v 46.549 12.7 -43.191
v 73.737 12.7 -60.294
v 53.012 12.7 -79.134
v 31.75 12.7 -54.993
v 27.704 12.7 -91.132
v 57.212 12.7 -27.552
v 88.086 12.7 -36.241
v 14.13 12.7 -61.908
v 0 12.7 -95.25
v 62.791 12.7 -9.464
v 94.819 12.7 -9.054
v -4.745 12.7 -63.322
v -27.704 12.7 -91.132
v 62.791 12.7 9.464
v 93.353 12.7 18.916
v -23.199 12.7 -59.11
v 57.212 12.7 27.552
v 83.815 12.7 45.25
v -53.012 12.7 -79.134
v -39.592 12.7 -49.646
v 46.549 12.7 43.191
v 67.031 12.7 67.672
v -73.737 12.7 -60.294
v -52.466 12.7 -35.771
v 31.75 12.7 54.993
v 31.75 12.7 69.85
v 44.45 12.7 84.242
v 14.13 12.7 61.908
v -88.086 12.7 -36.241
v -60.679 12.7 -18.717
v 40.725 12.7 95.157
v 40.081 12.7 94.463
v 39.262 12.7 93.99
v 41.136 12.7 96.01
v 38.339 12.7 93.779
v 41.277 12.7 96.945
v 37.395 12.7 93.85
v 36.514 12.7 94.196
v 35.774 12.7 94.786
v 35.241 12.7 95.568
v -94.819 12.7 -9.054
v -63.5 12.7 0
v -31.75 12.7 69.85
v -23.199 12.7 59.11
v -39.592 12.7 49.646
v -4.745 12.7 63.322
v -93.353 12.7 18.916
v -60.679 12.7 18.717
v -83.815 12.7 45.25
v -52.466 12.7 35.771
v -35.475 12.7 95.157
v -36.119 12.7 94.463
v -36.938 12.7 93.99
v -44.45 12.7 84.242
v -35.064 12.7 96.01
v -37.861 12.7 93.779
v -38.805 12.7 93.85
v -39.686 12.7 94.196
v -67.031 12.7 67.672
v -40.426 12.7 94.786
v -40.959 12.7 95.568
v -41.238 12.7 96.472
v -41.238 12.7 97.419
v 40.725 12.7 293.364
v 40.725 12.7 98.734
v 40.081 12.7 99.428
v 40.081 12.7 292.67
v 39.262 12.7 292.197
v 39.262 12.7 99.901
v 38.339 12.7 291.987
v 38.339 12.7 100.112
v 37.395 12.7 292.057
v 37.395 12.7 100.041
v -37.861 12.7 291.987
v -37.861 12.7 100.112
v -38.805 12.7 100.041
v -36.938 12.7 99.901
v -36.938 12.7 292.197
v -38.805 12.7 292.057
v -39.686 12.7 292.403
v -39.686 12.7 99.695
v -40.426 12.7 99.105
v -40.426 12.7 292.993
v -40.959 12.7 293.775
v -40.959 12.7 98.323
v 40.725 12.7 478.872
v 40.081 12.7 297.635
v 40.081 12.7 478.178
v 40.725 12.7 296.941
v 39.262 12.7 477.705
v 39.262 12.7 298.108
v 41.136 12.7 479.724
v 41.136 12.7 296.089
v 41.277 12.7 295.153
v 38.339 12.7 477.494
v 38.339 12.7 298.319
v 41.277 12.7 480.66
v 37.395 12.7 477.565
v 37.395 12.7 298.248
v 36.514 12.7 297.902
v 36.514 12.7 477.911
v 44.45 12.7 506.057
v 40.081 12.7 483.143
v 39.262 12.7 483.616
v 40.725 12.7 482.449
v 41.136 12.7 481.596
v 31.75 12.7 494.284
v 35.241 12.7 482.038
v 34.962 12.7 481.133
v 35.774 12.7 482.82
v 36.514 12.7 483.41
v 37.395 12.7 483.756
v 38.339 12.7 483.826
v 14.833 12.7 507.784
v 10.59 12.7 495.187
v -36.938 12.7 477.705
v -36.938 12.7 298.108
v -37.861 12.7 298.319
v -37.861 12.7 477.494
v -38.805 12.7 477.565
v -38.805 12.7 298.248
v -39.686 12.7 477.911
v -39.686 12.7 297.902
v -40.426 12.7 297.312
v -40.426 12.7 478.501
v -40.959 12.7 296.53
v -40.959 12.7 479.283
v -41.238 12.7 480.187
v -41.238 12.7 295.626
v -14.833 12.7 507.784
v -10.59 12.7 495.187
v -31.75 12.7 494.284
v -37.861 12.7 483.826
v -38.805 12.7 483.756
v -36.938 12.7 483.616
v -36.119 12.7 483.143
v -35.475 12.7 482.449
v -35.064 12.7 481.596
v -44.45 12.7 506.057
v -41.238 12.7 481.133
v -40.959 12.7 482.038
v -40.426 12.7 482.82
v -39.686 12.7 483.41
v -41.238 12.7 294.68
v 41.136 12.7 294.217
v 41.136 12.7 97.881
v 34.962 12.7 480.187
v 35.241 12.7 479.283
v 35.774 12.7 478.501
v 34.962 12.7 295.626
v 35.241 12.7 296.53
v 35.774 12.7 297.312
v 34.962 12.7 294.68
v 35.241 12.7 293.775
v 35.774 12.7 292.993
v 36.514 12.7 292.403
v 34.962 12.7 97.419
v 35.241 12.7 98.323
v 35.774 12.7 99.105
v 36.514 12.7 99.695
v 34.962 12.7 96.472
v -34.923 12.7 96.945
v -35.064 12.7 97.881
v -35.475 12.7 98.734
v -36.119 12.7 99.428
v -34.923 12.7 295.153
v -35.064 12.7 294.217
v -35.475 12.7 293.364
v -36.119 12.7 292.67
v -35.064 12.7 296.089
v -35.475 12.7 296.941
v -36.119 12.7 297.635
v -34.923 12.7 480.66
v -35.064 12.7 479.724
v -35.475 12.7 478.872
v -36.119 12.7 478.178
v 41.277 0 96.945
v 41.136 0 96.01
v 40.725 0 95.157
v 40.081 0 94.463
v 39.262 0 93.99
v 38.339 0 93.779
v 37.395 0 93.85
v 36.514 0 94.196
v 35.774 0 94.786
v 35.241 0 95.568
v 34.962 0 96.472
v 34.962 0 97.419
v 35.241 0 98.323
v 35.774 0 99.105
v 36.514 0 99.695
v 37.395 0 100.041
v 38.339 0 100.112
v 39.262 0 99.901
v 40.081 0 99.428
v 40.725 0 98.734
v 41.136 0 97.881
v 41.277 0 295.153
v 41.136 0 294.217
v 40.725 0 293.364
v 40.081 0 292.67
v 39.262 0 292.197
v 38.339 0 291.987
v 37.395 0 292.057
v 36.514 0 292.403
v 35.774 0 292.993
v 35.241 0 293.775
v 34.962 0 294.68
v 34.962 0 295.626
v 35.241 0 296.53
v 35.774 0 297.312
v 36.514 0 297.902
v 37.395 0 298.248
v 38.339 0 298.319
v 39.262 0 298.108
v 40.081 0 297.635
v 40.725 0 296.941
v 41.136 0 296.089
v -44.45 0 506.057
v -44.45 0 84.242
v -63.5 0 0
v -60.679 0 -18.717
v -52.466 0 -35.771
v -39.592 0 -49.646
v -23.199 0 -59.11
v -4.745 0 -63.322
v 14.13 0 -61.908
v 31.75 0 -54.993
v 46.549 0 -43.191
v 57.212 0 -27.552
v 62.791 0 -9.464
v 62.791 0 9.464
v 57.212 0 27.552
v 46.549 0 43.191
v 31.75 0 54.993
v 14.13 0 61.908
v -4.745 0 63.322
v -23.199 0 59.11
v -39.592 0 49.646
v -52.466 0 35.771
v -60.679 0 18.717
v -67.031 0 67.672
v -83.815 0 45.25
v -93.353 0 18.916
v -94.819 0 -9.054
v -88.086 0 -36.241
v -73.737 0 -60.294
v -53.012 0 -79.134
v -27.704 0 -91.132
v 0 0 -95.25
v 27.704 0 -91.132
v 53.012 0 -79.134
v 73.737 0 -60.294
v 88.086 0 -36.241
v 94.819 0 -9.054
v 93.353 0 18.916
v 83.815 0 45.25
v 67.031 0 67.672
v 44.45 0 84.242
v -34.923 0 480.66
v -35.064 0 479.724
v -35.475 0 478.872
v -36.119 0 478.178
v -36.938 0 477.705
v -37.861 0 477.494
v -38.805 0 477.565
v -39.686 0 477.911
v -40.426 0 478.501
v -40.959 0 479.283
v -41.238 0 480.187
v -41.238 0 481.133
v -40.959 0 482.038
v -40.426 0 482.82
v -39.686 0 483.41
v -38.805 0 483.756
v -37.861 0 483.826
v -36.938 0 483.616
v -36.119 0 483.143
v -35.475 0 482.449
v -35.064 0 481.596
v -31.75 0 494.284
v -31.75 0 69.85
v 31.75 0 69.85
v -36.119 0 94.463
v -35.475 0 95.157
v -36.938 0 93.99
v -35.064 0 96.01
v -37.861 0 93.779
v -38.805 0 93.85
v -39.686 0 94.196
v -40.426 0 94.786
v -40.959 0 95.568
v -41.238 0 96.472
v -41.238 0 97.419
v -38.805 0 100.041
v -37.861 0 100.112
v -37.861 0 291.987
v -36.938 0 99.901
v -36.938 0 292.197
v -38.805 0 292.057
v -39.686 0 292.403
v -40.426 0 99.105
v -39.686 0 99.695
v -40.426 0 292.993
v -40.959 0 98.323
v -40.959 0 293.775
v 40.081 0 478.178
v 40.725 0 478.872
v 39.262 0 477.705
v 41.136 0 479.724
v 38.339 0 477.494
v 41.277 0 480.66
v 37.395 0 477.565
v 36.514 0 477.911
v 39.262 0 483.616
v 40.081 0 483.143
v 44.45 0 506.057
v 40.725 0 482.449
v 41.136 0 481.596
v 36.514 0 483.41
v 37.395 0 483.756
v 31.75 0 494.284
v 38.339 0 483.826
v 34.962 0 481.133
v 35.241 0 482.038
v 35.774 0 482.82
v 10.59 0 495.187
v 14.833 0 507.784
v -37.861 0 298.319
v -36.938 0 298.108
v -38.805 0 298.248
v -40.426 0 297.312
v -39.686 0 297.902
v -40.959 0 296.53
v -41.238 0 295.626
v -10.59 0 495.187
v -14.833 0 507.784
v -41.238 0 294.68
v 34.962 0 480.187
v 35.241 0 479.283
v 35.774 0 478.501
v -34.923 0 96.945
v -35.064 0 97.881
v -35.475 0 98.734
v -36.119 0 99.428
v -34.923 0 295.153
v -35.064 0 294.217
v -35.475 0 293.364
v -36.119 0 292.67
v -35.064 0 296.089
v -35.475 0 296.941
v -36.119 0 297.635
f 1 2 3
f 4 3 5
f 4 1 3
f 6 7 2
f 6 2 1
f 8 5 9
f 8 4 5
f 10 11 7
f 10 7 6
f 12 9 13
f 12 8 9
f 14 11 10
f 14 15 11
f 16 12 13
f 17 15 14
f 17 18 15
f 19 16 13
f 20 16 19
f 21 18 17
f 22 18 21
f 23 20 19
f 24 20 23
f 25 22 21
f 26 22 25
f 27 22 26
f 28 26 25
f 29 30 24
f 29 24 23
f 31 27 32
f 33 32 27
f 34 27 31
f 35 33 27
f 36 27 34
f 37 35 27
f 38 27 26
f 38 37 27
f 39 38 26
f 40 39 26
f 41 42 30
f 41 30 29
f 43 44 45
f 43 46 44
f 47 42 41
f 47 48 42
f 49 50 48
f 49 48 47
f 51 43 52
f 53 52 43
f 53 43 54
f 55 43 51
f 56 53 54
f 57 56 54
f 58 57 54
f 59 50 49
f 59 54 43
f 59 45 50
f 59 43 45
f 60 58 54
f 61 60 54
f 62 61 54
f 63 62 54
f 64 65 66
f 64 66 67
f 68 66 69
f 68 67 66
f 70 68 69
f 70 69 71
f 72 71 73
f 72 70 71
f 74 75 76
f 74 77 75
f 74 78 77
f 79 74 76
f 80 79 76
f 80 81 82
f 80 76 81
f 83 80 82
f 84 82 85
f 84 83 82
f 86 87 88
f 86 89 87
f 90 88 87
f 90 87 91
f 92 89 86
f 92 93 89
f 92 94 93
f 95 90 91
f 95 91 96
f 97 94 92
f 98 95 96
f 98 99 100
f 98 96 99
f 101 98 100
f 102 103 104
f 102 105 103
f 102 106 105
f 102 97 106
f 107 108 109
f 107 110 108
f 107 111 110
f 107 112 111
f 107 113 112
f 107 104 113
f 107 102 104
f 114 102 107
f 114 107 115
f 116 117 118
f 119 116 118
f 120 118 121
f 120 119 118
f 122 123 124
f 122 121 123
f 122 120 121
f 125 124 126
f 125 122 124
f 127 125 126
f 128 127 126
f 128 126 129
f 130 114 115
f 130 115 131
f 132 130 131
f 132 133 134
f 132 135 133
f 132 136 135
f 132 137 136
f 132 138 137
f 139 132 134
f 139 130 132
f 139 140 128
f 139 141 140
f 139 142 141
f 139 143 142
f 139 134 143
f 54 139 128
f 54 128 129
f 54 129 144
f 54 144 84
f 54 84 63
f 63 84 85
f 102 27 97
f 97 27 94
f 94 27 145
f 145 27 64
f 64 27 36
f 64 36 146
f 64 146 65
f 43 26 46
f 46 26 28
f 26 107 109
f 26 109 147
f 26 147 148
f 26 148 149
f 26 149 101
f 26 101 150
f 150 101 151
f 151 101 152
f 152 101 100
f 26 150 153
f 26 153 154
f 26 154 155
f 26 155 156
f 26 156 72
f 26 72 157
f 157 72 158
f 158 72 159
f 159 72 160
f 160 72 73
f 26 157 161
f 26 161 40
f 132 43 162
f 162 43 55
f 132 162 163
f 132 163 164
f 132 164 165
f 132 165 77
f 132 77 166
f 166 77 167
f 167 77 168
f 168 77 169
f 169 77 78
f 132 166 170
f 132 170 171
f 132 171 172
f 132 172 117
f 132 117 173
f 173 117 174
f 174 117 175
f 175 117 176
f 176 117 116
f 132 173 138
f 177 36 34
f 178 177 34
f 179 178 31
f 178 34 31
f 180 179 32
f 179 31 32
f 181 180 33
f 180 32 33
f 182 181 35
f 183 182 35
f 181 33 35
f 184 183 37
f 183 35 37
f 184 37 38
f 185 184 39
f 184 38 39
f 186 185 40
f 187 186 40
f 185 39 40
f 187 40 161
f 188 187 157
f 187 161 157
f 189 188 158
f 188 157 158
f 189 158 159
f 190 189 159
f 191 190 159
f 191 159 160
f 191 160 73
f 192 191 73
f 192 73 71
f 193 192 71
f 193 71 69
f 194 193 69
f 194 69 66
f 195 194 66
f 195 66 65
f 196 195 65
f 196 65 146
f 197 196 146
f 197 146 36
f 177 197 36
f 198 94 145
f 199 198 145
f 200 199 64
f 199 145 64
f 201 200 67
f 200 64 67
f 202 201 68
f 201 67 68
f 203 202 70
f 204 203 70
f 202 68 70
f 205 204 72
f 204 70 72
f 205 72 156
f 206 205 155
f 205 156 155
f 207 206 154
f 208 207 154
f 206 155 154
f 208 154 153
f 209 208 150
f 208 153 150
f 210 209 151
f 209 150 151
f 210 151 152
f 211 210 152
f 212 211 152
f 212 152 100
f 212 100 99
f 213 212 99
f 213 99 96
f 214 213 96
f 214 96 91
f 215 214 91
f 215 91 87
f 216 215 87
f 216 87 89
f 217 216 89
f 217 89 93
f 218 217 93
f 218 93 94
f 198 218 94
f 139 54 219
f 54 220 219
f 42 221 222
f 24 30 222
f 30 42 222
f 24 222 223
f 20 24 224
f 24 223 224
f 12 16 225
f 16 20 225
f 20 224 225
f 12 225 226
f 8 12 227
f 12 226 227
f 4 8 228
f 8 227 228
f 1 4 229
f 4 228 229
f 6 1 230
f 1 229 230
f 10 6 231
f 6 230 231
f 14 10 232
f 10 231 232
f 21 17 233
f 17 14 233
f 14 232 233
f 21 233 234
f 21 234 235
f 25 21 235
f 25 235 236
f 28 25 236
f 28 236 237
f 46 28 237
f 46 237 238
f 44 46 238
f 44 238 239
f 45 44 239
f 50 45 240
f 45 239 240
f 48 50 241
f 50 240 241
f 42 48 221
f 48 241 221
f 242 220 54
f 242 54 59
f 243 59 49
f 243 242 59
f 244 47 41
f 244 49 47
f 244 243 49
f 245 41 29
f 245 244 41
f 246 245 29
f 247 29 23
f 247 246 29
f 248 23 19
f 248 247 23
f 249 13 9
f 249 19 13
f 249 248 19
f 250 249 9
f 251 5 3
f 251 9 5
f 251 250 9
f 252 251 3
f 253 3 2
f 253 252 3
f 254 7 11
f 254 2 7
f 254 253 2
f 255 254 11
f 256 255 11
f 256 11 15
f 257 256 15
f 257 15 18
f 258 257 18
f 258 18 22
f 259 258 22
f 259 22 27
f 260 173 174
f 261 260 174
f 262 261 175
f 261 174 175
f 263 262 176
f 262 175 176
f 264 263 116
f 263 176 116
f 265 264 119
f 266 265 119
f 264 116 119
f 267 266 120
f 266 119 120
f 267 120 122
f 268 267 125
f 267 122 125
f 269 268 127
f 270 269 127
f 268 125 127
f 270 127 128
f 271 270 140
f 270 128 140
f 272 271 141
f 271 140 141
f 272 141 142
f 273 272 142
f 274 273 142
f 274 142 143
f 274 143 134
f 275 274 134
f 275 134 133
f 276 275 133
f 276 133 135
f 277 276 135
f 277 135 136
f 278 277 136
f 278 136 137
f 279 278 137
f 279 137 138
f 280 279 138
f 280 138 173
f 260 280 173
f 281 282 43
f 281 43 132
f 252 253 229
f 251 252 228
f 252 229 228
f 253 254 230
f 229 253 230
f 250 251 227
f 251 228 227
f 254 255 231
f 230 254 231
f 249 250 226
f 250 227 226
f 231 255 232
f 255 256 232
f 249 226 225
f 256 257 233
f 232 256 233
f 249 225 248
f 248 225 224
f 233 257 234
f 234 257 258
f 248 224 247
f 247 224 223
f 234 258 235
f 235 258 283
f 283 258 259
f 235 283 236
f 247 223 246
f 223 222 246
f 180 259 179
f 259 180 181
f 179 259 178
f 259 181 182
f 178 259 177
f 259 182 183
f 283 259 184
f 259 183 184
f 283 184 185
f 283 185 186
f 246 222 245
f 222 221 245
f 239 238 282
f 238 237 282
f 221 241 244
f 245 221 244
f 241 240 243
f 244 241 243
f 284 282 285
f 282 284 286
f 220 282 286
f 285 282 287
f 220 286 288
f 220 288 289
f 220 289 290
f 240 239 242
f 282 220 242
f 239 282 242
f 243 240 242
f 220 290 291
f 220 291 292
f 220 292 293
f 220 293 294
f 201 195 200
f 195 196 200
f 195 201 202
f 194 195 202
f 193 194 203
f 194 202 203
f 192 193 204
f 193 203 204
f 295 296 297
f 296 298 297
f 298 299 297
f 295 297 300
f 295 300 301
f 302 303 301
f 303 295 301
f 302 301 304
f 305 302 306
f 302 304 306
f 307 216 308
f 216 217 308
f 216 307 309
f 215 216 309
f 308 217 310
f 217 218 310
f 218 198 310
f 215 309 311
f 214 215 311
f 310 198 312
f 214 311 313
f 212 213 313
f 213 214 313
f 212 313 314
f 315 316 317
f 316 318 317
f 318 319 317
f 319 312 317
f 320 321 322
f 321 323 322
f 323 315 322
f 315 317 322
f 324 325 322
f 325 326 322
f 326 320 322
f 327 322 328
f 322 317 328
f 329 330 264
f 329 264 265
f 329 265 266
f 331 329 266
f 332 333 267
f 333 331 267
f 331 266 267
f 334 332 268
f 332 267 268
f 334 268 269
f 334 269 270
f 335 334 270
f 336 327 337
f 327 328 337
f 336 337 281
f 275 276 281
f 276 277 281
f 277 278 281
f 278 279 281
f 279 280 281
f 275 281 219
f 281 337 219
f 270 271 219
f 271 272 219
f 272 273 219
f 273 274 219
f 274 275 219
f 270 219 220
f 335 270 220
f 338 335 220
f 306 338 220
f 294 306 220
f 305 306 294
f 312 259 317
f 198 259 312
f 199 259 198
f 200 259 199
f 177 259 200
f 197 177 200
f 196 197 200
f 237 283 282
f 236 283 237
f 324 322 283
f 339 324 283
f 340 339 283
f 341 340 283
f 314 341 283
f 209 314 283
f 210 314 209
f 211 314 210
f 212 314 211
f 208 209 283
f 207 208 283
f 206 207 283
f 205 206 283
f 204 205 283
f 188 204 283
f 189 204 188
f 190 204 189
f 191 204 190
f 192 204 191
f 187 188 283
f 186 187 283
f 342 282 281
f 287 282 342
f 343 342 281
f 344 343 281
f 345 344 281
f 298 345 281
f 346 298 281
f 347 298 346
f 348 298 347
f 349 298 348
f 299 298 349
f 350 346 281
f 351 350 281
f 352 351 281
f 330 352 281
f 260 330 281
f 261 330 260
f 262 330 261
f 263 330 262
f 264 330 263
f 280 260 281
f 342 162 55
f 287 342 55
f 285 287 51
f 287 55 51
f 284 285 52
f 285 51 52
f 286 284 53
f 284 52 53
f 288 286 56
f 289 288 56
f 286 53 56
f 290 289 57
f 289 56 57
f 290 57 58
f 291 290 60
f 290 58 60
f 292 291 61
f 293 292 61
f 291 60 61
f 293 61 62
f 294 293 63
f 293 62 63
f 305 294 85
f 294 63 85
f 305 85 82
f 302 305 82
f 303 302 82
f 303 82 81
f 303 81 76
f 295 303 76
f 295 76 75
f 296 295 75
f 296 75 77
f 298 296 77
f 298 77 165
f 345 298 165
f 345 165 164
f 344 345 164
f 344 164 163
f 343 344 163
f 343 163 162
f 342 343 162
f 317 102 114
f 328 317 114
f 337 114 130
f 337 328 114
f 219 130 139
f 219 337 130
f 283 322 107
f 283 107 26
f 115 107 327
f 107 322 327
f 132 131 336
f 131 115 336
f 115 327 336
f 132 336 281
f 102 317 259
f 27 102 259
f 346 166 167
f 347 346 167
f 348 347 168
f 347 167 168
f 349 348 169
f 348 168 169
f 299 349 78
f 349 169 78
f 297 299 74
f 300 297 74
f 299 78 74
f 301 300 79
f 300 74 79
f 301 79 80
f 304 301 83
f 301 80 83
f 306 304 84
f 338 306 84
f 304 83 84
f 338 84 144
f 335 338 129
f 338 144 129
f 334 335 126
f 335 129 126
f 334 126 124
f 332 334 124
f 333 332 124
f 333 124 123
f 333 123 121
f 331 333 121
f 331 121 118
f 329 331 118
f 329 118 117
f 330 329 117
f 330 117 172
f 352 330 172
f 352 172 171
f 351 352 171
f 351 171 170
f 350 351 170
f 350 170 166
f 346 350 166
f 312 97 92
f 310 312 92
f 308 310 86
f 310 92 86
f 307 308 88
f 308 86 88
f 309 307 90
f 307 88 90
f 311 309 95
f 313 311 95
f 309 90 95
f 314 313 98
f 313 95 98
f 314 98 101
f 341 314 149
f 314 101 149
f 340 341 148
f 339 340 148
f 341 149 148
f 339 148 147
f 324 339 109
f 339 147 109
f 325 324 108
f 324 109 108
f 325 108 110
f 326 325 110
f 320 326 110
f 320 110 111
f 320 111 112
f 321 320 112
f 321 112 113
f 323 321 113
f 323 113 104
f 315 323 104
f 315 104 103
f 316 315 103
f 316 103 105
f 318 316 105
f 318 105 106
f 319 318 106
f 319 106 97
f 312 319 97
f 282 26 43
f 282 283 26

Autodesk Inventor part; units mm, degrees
ref_plane "YZ Plane" through (0, 0, 0) normal (1, 0, 0) x (0, 1, 0)
ref_plane "XZ Plane" through (0, 0, 0) normal (0, 1, 0) x (-1, 0, 0)
ref_plane "XY Plane" through (0, 0, 0) normal (0, 0, 1) x (1, 0, 0)
sketch "Sketch2" plane through (0, 0, 0) normal (0, 1, 0) x (-1, 0, 0)
  arc A0 (44.45, 506.057) -> (-44.45, 506.057) centre (0, -1.4242) ccw construction
  arc A1 (44.45, 506.057) -> (-44.45, 506.057) centre (0, -1.4242) ccw
  line L0 (44.45, 84.2423) -> (44.45, 506.057)
  line L1 (-44.45, 506.057) -> (-44.45, 84.2423)
  circle A2 centre (0, 0) radius 57.15 construction
  circle A3 centre (0, 0) radius 63.5
  arc A4 (-44.45, 84.2423) -> (44.45, 84.2423) centre (0, 0) ccw
  line L2 (0, 0) -> (0, 508) construction
  arc A5 (31.75, 494.2843) -> (-31.75, 494.2843) centre (0, -1.4242) ccw
  line L3 (-31.75, 494.2843) -> (-31.75, 69.85)
  arc A6 (-31.75, 77.0401) -> (31.75, 77.0401) centre (0, 0) ccw construction
  line L4 (31.75, 69.85) -> (31.75, 494.2843)
  arc A7 (31.75, 62.217) -> (-31.75, 62.217) centre (0, 0) ccw construction
  line L5 (0, 69.85) -> (0, 63.5) construction
  line L6 (-31.75, 69.85) -> (31.75, 69.85)
  point P0 (-7.0927, 251.5509)
  dimension "d23" = 127
  dimension "d21" = 88.9
  dimension "d22" = 114.3
  dimension "d24" = 190.5
  dimension "d25" = 508
  dimension "d26" = 88.9
  dimension "d29" = 12.7
  dimension "d31" = 139.7
  dimension "d69" = 12.7
  dimension "d70" = 12.7
extrude "Extrusion2" add sketch "Sketch2" along normal blind 12.7
sketch "Sketch3" plane through (0, 12.7, 0) normal (0, 1, 0) x (1, 0, 0)
  arc A0 (-44.4483, -506.0602) -> (44.4517, -506.0602) centre (0.0017, 1.4211) ccw construction
  line L0 (44.4517, -506.0602) -> (44.4517, -84.2454) construction
  line L1 (-44.4483, -506.0602) -> (44.4517, -506.0602) construction
  line L2 (44.4517, -506.0602) -> (44.4517, -84.2454) construction
  line L3 (44.4517, -84.2454) -> (-44.4483, -84.2454) construction
  line L4 (-44.4483, -84.2454) -> (-44.4483, -506.0602) construction
  line L5 (-44.4483, -84.2454) -> (-44.4483, -506.0602) construction
  line L6 (-44.4483, -295.1528) -> (-38.0983, -295.1528) construction
  line L7 (-38.0983, -295.1528) -> (-38.0983, -506.0602) construction
  line L8 (-38.0983, -295.1528) -> (-38.0983, -84.2454) construction
  circle A1 centre (-38.0983, -96.9454) radius 3.175
  circle A2 centre (-38.0983, -480.6602) radius 3.175
  circle A3 centre (-38.0983, -295.1528) radius 3.175
  line L9 (0.0017, -506.0602) -> (0.0017, 1.4211) construction
  circle A4 centre (38.1017, -295.1528) radius 3.175
  line L10 (44.4517, -295.1528) -> (38.1017, -295.1528) construction
  circle A5 centre (38.1017, -96.9454) radius 3.175
  circle A6 centre (38.1017, -480.6602) radius 3.175
  line L11 (38.1017, -295.1528) -> (38.1017, -506.0602) construction
  line L12 (38.1017, -295.1528) -> (38.1017, -84.2454) construction
  line L13 (44.4517, -84.2454) -> (44.4517, -506.0602) construction
  line L14 (44.4517, -84.2454) -> (44.4517, -506.0602) construction
  point P0 (0, 0)
  dimension "d54" = 6.35
  dimension "d55" = 90
  dimension "d56" = 6.35
  dimension "d57" = 12.7
  dimension "d58" = 6.35
  dimension "d59" = 6.35
  dimension "d60" = 25.4
extrude "Extrusion3" cut sketch "Sketch3" against normal blind 12.7
equation "\"d26\" = d21"
properties part number "Arm Layer 3"
